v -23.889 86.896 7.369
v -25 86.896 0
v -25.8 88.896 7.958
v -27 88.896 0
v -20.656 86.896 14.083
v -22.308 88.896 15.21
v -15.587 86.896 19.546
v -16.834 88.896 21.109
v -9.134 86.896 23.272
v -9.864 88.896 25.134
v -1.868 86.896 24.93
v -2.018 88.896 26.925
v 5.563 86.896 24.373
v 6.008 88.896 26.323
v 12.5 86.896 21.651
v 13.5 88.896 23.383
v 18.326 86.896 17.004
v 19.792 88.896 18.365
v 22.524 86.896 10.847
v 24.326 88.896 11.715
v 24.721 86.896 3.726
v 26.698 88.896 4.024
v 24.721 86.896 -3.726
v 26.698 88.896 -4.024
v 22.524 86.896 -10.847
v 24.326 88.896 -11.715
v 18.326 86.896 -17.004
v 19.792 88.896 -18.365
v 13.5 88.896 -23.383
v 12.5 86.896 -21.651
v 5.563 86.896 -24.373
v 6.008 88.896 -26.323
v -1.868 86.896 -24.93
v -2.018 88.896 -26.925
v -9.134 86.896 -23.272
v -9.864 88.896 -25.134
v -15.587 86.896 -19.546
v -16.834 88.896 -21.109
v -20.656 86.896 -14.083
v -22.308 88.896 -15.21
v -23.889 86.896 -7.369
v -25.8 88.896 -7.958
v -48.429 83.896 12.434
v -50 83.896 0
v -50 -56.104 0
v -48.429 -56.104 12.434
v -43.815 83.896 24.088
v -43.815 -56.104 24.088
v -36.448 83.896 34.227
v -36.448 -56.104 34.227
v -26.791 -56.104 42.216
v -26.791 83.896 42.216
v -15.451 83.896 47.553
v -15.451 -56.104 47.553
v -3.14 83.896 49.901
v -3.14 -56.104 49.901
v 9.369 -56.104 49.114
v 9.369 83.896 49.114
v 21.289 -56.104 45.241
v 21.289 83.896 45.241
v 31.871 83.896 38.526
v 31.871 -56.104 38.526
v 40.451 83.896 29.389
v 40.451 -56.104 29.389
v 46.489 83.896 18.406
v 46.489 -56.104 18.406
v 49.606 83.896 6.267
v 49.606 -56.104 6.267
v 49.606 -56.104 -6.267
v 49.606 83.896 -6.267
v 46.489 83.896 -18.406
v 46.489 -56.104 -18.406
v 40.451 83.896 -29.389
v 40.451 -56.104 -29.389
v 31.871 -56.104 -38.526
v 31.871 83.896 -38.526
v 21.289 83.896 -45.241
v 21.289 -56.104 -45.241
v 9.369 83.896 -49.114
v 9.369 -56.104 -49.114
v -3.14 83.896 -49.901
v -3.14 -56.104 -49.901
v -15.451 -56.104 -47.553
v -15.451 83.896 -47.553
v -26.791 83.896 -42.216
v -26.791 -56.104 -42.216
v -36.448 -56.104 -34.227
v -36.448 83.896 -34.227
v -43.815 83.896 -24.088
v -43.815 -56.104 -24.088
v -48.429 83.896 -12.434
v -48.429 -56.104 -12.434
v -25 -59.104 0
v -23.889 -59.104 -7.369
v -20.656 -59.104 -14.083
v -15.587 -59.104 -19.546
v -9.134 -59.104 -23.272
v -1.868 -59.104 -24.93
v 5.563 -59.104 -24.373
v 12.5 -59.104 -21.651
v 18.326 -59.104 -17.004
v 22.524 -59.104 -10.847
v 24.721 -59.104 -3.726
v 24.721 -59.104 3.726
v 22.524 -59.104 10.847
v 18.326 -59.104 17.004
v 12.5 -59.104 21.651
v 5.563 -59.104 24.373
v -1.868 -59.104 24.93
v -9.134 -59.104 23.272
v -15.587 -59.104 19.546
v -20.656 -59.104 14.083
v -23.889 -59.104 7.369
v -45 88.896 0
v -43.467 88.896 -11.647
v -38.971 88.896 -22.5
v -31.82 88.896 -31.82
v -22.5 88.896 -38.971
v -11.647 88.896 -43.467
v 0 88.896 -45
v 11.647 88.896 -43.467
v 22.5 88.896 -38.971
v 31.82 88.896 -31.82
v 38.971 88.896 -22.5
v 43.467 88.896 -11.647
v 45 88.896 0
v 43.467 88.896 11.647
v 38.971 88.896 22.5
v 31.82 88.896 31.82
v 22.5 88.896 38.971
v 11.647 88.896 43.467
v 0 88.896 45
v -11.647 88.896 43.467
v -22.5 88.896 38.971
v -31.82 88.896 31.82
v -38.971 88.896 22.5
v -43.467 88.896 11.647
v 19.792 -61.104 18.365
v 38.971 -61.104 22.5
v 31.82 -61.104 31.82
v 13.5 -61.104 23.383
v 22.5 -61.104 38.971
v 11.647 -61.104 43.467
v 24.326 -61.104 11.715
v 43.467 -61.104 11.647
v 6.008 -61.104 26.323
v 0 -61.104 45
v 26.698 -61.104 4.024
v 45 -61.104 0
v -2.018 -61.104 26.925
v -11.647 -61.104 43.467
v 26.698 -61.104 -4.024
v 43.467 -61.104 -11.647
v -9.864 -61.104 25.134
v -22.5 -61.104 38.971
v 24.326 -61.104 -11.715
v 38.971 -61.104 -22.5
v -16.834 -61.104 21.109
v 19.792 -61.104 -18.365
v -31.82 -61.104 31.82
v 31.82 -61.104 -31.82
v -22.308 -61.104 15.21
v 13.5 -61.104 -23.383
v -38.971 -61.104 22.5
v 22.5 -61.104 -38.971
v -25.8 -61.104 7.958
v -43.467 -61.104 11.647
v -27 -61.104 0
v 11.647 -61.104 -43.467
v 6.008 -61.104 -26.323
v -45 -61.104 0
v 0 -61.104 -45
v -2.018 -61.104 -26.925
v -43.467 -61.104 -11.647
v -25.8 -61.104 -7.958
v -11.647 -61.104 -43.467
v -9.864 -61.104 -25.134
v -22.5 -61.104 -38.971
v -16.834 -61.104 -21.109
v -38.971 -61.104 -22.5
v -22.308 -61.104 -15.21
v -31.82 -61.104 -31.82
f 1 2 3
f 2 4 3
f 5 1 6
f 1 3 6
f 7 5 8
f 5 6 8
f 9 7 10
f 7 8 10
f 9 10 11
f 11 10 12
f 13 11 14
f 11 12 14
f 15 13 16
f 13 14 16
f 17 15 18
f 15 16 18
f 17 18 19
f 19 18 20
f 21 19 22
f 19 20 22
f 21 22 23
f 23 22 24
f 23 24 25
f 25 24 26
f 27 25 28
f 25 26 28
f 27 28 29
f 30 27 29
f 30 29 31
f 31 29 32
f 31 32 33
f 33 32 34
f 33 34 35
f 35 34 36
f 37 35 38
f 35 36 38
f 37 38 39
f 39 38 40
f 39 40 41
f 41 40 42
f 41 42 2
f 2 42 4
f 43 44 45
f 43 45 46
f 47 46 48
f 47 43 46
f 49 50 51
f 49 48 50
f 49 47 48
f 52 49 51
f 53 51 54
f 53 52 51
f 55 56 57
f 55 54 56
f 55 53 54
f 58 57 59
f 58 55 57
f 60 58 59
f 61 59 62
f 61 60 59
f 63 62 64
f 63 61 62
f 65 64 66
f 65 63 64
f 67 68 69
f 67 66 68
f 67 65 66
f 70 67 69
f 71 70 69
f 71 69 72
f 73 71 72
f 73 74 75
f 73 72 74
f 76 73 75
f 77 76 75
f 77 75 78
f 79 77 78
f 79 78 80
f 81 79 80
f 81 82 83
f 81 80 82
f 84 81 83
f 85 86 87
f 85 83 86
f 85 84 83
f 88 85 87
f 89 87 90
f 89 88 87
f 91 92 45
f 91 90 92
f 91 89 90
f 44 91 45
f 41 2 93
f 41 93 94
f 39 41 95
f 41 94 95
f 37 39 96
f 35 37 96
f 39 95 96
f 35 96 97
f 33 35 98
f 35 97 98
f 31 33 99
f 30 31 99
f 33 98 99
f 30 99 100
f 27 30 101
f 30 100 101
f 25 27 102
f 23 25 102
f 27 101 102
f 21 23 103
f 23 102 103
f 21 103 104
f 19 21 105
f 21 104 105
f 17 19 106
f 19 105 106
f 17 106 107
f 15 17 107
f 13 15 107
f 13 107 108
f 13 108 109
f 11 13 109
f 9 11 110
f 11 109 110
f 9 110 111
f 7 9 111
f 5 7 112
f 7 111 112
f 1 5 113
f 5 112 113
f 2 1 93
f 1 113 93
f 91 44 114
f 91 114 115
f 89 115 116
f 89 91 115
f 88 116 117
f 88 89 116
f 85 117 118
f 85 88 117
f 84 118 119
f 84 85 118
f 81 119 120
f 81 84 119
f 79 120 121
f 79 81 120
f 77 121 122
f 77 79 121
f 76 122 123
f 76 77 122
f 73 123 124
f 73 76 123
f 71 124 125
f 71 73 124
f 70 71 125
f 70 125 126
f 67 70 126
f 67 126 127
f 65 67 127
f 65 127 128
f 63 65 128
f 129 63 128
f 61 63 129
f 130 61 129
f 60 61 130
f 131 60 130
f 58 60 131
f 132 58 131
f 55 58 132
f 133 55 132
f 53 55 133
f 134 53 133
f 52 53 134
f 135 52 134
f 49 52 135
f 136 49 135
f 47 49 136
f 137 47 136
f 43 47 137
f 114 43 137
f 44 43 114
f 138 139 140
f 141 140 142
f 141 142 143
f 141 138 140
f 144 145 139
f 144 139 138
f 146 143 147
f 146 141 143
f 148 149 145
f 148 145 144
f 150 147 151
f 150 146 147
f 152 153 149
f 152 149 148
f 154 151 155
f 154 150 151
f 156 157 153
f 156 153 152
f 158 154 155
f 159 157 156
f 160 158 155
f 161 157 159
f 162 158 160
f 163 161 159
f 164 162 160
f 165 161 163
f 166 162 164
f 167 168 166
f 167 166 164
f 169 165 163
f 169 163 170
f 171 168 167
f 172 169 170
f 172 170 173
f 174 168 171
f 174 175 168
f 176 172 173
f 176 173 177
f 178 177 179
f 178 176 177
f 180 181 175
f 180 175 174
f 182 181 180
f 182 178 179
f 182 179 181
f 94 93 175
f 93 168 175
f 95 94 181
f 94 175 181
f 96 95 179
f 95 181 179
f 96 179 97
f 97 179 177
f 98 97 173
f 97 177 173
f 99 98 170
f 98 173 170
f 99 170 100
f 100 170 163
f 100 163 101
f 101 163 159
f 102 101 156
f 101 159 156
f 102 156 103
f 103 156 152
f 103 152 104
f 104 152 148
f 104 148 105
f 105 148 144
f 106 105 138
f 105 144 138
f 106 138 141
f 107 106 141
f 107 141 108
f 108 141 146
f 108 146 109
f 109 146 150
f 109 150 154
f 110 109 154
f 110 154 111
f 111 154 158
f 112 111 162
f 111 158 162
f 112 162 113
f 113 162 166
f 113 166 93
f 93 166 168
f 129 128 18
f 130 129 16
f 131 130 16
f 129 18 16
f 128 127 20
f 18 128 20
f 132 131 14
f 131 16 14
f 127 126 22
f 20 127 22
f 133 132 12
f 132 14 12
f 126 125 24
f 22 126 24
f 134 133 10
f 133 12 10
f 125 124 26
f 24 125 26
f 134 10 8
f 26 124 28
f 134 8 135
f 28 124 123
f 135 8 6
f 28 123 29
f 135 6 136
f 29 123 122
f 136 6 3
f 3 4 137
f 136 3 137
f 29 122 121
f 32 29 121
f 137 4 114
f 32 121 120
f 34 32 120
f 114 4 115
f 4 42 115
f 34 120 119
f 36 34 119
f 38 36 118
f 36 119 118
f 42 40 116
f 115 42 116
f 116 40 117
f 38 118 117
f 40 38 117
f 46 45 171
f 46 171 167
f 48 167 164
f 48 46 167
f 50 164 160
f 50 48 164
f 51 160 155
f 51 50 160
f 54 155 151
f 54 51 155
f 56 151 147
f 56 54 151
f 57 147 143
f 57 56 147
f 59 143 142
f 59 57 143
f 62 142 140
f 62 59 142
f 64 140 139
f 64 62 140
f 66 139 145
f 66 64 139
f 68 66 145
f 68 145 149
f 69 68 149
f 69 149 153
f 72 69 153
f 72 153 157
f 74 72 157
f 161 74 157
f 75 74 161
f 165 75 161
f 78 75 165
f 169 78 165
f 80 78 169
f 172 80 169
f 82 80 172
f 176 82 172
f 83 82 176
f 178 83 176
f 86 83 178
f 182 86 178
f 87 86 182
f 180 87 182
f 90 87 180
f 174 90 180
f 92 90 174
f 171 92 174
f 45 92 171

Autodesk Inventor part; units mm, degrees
ref_plane "YZ Plane" through (0, 0, 0) normal (1, 0, 0) x (0, 1, 0)
ref_plane "XZ Plane" through (0, 0, 0) normal (0, 1, 0) x (-1, 0, 0)
ref_plane "XY Plane" through (0, 0, 0) normal (0, 0, 1) x (1, 0, 0)
sketch "Sketch1" plane through (0, 0, 0) normal (0, 0, 1) x (1, 0, 0)
  line L0 (-50, 88.8965) -> (-25, 88.8965)
  line L1 (-25, 88.8965) -> (-25, -61.1035)
  line L2 (-25, -61.1035) -> (-50, -61.1035)
  line L3 (-50, -61.1035) -> (-50, 88.8965)
  line L4 (0, 88.8965) -> (0, -88.8965)
  point P0 (0, 0)
  point P1 (0, 0)
  dimension "d10" = 150
  dimension "d12" = 25
  dimension "d13" = 50
revolve "Revolution1" add sketch "Sketch1" angle 360 about axis through (0, 88.8965, 0) along (0, -1, 0)
chamfer "Chamfer1" distance 2 angle 45 2 edges at (25, 88.8965, 0) (25, -61.1035, 0)
chamfer "Chamfer3" distance 5 angle 45 2 edges at (50, 88.8965, 0) (50, -61.1035, 0)
properties part number "TestPart"
